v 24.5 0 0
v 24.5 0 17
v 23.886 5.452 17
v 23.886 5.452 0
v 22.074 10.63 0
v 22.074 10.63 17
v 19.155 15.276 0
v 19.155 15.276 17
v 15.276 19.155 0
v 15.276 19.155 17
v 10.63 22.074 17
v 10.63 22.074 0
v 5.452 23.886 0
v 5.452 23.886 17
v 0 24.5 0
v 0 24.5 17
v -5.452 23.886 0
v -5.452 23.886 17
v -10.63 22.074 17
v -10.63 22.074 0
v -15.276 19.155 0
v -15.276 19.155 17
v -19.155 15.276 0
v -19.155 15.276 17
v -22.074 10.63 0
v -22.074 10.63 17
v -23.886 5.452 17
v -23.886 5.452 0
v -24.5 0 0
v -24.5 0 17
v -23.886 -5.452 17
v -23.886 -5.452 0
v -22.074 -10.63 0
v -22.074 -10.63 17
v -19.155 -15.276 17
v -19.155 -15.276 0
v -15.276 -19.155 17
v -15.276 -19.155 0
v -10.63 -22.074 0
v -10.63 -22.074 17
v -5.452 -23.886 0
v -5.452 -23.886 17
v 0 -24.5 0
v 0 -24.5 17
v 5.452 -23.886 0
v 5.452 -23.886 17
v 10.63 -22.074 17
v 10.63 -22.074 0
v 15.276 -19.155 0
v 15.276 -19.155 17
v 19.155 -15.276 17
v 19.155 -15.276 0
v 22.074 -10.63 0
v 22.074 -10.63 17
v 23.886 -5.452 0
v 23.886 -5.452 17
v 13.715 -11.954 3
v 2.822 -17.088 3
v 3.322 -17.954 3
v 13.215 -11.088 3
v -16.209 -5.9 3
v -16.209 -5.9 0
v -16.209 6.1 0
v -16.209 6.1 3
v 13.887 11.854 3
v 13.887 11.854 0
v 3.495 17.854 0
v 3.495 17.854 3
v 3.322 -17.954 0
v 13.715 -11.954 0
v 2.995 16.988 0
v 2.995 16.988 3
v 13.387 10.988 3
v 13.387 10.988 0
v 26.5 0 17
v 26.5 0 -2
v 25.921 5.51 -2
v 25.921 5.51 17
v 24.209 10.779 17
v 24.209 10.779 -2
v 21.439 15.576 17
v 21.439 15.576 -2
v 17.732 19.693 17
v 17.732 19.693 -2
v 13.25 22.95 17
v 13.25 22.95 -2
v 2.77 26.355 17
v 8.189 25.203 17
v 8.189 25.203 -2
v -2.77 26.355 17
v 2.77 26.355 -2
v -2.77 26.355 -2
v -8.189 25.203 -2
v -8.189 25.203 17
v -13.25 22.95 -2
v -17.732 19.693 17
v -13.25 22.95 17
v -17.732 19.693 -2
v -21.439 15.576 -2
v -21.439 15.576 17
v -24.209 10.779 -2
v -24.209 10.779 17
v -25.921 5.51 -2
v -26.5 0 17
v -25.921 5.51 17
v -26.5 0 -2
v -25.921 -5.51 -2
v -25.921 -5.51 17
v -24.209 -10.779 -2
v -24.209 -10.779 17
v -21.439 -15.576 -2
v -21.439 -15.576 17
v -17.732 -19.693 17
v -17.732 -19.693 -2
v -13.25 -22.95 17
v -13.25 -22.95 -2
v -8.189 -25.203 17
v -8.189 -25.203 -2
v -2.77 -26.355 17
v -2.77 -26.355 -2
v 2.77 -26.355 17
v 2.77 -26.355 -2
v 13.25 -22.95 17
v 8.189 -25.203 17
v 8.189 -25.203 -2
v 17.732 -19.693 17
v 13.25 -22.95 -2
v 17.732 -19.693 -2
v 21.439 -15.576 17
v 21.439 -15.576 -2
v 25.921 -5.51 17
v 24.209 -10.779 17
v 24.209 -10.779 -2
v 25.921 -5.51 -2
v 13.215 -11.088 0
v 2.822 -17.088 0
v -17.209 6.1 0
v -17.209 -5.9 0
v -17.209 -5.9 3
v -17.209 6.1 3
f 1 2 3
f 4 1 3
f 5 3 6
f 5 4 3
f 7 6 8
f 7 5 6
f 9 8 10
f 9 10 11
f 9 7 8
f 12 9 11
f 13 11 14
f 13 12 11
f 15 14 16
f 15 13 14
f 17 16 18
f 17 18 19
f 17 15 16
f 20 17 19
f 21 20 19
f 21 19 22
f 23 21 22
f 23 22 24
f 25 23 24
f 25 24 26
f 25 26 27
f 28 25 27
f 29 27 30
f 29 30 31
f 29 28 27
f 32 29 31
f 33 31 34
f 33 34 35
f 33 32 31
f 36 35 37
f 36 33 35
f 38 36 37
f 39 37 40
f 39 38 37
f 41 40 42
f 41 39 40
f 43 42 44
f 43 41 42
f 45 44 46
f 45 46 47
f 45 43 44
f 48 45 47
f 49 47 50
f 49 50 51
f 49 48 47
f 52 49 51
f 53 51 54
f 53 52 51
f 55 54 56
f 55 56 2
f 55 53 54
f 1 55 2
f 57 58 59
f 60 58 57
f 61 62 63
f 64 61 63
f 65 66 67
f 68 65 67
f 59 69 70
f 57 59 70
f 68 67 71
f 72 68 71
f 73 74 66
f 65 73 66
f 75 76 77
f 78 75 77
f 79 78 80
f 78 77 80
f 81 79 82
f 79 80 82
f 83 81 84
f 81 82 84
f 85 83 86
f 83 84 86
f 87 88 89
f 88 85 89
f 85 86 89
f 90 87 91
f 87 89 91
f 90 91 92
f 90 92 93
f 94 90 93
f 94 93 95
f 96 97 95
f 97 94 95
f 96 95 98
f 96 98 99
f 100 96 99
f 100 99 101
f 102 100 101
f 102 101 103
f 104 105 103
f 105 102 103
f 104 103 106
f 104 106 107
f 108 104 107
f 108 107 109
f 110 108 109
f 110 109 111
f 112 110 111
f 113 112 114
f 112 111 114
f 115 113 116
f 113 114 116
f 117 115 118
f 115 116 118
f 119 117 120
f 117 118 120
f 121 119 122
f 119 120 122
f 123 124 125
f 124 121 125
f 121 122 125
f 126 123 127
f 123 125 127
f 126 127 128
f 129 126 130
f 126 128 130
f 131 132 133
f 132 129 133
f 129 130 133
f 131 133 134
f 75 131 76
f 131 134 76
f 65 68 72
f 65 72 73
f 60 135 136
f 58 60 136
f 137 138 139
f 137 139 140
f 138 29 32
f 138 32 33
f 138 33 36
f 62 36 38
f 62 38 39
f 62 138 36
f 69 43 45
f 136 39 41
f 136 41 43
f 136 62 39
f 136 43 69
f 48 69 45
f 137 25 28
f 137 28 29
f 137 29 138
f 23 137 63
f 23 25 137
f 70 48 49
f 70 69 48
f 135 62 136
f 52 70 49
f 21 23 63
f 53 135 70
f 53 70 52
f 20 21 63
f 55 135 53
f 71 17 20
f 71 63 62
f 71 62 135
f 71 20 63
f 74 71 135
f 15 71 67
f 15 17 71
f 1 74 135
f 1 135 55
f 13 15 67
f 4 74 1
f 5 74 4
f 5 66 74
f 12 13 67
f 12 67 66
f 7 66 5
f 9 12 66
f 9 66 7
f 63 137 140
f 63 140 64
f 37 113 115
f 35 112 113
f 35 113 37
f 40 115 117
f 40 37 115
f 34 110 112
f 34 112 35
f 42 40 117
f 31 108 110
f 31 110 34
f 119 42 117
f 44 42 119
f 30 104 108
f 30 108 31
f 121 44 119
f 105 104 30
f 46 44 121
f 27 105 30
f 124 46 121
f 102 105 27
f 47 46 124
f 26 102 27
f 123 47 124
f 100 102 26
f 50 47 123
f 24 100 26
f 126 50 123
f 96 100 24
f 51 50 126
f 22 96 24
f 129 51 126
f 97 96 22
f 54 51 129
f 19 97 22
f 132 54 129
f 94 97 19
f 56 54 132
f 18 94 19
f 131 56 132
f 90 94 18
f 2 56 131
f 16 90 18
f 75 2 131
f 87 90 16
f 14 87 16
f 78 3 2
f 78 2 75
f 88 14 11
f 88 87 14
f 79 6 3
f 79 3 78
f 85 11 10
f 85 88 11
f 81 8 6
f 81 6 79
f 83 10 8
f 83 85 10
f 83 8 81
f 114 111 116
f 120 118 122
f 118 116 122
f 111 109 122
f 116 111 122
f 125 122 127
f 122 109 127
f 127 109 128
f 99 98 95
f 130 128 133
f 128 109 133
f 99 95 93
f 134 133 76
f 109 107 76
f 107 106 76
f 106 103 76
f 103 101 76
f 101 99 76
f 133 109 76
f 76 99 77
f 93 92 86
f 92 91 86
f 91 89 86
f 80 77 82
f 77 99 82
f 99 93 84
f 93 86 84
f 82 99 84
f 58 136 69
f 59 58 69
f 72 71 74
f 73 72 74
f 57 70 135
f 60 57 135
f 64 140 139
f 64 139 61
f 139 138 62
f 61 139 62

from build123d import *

# Parameters (mm, degrees)
F0_R     = 24.5
F1_DEPTH = 17
F2_T     = 2
F3_W     = 1
F3_H     = 12
F4_DEPTH = 3


with BuildPart() as f1:
    # F0 (on Top) → F1 (new body)
    with BuildSketch(Plane.XY):
        Circle(F0_R)
    extrude(amount=F1_DEPTH)

    # F2
    f2_openings = [f1.faces().sort_by_distance(p)[0] for p in [
        (0, 0, 17),
    ]]
    offset(amount=F2_T, openings=f2_openings, kind=Kind.INTERSECTION)

    # F3 (on face) → F4 (join)
    with BuildSketch(Plane.XY):
        with Locations((-16.7093845084, 0.0996340905)):
            Rectangle(F3_W, F3_H)
        Polygon((3.322254178, -17.9535812131), (13.7145590234, -11.9535812131), (13.2145590234, -11.0875558093), (2.822254178, -17.0875558093), align=None)
        Polygon((13.8871303304, 11.8539471225), (3.494825485, 17.8539471225), (2.994825485, 16.9879217187), (13.3871303304, 10.9879217187), align=None)
    extrude(amount=F4_DEPTH)


solid = f1.part
